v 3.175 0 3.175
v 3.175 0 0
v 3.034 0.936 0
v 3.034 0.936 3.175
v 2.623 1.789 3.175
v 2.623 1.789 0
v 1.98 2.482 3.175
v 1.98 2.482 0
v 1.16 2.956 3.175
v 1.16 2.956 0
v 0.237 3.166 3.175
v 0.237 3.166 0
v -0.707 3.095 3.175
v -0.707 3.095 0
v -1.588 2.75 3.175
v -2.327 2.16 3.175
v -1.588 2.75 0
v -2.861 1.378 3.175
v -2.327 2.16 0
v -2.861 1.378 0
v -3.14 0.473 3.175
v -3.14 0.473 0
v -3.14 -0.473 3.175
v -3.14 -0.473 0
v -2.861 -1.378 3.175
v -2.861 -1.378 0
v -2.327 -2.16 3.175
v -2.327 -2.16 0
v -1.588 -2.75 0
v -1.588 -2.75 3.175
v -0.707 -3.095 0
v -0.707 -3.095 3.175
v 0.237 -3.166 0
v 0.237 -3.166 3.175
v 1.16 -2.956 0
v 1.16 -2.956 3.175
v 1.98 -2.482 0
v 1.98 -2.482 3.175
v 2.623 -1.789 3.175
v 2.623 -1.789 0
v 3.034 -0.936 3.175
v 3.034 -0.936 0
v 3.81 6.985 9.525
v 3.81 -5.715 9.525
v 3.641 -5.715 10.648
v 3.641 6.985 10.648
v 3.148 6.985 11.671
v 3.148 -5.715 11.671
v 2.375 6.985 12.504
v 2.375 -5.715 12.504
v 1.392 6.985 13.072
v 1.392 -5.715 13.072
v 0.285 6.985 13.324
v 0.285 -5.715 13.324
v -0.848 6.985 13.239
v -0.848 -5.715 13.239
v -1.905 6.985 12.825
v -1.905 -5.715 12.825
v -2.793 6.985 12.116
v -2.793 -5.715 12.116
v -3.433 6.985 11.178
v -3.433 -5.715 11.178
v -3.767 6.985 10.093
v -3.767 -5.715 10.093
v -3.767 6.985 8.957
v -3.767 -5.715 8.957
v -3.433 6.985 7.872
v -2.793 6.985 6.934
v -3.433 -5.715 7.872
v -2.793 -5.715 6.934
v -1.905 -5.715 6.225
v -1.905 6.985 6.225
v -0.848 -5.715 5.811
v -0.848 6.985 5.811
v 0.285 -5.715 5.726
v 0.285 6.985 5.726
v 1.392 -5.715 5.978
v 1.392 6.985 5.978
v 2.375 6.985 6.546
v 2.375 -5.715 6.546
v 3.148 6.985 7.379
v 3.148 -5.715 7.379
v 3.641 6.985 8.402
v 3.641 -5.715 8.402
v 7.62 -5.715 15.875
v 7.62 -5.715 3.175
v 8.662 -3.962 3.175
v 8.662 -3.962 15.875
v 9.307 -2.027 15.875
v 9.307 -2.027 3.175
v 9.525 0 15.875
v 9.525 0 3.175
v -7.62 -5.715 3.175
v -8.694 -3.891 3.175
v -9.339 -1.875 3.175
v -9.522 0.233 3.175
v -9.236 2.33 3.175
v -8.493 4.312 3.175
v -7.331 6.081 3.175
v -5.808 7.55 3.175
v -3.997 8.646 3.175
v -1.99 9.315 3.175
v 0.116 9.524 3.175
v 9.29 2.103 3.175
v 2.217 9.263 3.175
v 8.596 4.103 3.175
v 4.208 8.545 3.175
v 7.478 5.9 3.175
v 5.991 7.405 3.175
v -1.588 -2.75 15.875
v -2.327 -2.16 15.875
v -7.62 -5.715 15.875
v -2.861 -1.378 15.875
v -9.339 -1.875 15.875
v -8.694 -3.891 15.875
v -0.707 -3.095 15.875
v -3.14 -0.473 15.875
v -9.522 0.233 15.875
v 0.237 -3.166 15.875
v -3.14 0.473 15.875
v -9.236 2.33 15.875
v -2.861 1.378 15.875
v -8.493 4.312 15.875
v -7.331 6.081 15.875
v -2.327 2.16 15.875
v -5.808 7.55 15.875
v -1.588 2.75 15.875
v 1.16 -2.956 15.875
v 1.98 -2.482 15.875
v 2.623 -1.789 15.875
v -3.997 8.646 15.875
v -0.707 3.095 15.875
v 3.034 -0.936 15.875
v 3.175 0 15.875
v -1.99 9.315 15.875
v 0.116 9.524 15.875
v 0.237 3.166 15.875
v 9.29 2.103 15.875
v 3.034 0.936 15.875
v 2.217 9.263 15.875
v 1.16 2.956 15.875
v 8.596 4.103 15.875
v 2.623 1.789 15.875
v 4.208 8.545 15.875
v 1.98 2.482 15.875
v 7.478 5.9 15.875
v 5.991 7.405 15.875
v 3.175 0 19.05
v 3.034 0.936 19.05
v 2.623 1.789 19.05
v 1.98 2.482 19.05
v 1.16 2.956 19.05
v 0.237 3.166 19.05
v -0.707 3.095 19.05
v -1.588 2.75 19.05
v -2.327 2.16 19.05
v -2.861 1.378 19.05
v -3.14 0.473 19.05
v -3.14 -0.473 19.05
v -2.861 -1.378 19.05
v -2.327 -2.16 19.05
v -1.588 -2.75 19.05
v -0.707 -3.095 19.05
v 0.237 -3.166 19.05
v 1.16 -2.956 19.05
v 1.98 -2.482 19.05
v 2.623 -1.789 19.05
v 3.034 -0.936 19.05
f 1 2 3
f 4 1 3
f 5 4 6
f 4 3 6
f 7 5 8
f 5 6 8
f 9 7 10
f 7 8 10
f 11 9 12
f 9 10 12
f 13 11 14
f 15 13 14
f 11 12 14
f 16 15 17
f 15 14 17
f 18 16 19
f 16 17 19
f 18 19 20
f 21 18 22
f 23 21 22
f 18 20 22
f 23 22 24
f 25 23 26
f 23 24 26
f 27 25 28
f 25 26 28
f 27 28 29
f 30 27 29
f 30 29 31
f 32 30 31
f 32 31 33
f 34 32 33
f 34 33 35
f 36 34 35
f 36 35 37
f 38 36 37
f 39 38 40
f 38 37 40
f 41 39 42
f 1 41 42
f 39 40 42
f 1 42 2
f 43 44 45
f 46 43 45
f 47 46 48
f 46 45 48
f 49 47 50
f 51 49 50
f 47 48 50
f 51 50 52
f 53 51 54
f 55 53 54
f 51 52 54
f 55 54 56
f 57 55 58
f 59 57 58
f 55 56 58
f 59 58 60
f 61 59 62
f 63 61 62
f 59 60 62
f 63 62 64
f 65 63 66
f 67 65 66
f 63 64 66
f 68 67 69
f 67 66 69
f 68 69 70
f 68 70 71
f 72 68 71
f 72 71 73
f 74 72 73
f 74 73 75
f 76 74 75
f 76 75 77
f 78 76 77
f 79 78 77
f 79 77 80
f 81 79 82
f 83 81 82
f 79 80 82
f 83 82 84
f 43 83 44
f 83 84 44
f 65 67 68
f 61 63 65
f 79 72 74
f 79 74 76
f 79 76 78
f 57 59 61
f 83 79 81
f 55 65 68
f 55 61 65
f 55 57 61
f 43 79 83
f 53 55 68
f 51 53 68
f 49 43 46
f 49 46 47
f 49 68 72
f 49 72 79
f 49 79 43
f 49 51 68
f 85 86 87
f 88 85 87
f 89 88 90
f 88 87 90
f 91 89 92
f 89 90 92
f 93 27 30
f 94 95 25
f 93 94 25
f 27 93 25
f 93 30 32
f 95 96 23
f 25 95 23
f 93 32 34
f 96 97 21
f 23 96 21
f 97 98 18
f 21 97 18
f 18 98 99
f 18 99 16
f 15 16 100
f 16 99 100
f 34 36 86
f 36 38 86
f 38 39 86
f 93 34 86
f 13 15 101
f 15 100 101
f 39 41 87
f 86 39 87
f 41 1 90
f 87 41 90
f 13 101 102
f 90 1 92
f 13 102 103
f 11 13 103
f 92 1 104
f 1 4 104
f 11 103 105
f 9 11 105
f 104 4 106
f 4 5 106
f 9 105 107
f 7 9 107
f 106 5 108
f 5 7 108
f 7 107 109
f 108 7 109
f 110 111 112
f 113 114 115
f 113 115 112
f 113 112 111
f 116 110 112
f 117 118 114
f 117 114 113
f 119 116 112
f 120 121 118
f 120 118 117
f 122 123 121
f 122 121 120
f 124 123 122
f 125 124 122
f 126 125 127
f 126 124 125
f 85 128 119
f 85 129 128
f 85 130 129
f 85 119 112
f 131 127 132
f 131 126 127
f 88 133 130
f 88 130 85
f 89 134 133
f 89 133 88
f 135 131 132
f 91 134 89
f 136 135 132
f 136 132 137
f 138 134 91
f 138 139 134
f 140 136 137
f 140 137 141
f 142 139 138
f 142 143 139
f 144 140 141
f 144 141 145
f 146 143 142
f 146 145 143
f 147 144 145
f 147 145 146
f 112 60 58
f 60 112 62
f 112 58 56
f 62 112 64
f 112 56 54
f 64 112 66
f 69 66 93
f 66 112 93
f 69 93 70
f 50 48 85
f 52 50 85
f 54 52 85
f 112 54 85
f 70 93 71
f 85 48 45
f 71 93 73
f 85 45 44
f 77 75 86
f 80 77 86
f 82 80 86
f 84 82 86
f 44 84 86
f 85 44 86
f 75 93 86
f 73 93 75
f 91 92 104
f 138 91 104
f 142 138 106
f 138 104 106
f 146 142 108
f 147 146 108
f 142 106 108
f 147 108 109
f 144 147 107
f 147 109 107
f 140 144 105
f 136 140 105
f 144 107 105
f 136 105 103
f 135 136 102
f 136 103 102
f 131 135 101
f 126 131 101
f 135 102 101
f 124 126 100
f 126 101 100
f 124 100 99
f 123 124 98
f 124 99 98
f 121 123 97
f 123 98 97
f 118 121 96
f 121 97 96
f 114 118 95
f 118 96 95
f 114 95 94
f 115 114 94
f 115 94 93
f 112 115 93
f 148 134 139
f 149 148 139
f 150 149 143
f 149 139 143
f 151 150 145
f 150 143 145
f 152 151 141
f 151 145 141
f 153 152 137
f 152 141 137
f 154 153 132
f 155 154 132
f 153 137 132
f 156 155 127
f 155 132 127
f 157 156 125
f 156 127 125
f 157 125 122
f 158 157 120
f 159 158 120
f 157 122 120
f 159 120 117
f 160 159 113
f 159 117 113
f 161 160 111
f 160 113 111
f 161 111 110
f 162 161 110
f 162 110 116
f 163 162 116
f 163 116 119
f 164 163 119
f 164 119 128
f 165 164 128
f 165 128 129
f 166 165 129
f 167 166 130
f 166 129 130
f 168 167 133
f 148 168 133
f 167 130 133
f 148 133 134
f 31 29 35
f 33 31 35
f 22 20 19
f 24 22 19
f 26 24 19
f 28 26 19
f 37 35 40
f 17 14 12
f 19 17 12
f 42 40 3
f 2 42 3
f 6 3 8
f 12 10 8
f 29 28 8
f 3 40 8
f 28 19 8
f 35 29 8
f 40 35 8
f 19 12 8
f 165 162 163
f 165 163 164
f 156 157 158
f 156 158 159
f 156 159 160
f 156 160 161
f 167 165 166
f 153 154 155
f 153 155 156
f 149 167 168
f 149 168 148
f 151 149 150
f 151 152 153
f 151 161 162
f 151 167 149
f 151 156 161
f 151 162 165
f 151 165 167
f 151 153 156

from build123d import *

# Parameters (mm, degrees)
F0_R     = 3.175
F1_DEPTH = 3.175
F2_R     = 3.175
F3_DEPTH = 12.7
F4_R     = 3.175
F5_DEPTH = 3.175
F6_R     = 3.81
F7_DEPTH = 12.7


with BuildPart() as f1:
    # F0 (on Top) → F1 (new body)
    with BuildSketch(Plane.XY):
        Circle(F0_R)
    extrude(amount=F1_DEPTH)

    # F2 (on face) → F3 (join)
    with BuildSketch(Plane.XY.offset(3.175)):
        with BuildLine():
            ThreePointArc((7.62, -5.715), (9.0362084139, -3.0120694713), (9.525, 0))
            ThreePointArc((9.525, 0), (-3.0120694713, 9.0362084139), (-7.62, -5.715))
            Line((-7.62, -5.715), (7.62, -5.715))
        make_face()
        Circle(F2_R, mode=Mode.SUBTRACT)
        Circle(F2_R)
    extrude(amount=F3_DEPTH)

    # F4 (on face) → F5 (join)
    with BuildSketch(Plane.XY.offset(15.875)):
        Circle(F4_R)
    extrude(amount=F5_DEPTH)

    # F6 (on face) → F7 (cut)
    with BuildSketch(Plane.XZ.offset(5.715)):
        with Locations((0, 9.525)):
            Circle(F6_R)
    extrude(amount=-F7_DEPTH, mode=Mode.SUBTRACT)


solid = f1.part
